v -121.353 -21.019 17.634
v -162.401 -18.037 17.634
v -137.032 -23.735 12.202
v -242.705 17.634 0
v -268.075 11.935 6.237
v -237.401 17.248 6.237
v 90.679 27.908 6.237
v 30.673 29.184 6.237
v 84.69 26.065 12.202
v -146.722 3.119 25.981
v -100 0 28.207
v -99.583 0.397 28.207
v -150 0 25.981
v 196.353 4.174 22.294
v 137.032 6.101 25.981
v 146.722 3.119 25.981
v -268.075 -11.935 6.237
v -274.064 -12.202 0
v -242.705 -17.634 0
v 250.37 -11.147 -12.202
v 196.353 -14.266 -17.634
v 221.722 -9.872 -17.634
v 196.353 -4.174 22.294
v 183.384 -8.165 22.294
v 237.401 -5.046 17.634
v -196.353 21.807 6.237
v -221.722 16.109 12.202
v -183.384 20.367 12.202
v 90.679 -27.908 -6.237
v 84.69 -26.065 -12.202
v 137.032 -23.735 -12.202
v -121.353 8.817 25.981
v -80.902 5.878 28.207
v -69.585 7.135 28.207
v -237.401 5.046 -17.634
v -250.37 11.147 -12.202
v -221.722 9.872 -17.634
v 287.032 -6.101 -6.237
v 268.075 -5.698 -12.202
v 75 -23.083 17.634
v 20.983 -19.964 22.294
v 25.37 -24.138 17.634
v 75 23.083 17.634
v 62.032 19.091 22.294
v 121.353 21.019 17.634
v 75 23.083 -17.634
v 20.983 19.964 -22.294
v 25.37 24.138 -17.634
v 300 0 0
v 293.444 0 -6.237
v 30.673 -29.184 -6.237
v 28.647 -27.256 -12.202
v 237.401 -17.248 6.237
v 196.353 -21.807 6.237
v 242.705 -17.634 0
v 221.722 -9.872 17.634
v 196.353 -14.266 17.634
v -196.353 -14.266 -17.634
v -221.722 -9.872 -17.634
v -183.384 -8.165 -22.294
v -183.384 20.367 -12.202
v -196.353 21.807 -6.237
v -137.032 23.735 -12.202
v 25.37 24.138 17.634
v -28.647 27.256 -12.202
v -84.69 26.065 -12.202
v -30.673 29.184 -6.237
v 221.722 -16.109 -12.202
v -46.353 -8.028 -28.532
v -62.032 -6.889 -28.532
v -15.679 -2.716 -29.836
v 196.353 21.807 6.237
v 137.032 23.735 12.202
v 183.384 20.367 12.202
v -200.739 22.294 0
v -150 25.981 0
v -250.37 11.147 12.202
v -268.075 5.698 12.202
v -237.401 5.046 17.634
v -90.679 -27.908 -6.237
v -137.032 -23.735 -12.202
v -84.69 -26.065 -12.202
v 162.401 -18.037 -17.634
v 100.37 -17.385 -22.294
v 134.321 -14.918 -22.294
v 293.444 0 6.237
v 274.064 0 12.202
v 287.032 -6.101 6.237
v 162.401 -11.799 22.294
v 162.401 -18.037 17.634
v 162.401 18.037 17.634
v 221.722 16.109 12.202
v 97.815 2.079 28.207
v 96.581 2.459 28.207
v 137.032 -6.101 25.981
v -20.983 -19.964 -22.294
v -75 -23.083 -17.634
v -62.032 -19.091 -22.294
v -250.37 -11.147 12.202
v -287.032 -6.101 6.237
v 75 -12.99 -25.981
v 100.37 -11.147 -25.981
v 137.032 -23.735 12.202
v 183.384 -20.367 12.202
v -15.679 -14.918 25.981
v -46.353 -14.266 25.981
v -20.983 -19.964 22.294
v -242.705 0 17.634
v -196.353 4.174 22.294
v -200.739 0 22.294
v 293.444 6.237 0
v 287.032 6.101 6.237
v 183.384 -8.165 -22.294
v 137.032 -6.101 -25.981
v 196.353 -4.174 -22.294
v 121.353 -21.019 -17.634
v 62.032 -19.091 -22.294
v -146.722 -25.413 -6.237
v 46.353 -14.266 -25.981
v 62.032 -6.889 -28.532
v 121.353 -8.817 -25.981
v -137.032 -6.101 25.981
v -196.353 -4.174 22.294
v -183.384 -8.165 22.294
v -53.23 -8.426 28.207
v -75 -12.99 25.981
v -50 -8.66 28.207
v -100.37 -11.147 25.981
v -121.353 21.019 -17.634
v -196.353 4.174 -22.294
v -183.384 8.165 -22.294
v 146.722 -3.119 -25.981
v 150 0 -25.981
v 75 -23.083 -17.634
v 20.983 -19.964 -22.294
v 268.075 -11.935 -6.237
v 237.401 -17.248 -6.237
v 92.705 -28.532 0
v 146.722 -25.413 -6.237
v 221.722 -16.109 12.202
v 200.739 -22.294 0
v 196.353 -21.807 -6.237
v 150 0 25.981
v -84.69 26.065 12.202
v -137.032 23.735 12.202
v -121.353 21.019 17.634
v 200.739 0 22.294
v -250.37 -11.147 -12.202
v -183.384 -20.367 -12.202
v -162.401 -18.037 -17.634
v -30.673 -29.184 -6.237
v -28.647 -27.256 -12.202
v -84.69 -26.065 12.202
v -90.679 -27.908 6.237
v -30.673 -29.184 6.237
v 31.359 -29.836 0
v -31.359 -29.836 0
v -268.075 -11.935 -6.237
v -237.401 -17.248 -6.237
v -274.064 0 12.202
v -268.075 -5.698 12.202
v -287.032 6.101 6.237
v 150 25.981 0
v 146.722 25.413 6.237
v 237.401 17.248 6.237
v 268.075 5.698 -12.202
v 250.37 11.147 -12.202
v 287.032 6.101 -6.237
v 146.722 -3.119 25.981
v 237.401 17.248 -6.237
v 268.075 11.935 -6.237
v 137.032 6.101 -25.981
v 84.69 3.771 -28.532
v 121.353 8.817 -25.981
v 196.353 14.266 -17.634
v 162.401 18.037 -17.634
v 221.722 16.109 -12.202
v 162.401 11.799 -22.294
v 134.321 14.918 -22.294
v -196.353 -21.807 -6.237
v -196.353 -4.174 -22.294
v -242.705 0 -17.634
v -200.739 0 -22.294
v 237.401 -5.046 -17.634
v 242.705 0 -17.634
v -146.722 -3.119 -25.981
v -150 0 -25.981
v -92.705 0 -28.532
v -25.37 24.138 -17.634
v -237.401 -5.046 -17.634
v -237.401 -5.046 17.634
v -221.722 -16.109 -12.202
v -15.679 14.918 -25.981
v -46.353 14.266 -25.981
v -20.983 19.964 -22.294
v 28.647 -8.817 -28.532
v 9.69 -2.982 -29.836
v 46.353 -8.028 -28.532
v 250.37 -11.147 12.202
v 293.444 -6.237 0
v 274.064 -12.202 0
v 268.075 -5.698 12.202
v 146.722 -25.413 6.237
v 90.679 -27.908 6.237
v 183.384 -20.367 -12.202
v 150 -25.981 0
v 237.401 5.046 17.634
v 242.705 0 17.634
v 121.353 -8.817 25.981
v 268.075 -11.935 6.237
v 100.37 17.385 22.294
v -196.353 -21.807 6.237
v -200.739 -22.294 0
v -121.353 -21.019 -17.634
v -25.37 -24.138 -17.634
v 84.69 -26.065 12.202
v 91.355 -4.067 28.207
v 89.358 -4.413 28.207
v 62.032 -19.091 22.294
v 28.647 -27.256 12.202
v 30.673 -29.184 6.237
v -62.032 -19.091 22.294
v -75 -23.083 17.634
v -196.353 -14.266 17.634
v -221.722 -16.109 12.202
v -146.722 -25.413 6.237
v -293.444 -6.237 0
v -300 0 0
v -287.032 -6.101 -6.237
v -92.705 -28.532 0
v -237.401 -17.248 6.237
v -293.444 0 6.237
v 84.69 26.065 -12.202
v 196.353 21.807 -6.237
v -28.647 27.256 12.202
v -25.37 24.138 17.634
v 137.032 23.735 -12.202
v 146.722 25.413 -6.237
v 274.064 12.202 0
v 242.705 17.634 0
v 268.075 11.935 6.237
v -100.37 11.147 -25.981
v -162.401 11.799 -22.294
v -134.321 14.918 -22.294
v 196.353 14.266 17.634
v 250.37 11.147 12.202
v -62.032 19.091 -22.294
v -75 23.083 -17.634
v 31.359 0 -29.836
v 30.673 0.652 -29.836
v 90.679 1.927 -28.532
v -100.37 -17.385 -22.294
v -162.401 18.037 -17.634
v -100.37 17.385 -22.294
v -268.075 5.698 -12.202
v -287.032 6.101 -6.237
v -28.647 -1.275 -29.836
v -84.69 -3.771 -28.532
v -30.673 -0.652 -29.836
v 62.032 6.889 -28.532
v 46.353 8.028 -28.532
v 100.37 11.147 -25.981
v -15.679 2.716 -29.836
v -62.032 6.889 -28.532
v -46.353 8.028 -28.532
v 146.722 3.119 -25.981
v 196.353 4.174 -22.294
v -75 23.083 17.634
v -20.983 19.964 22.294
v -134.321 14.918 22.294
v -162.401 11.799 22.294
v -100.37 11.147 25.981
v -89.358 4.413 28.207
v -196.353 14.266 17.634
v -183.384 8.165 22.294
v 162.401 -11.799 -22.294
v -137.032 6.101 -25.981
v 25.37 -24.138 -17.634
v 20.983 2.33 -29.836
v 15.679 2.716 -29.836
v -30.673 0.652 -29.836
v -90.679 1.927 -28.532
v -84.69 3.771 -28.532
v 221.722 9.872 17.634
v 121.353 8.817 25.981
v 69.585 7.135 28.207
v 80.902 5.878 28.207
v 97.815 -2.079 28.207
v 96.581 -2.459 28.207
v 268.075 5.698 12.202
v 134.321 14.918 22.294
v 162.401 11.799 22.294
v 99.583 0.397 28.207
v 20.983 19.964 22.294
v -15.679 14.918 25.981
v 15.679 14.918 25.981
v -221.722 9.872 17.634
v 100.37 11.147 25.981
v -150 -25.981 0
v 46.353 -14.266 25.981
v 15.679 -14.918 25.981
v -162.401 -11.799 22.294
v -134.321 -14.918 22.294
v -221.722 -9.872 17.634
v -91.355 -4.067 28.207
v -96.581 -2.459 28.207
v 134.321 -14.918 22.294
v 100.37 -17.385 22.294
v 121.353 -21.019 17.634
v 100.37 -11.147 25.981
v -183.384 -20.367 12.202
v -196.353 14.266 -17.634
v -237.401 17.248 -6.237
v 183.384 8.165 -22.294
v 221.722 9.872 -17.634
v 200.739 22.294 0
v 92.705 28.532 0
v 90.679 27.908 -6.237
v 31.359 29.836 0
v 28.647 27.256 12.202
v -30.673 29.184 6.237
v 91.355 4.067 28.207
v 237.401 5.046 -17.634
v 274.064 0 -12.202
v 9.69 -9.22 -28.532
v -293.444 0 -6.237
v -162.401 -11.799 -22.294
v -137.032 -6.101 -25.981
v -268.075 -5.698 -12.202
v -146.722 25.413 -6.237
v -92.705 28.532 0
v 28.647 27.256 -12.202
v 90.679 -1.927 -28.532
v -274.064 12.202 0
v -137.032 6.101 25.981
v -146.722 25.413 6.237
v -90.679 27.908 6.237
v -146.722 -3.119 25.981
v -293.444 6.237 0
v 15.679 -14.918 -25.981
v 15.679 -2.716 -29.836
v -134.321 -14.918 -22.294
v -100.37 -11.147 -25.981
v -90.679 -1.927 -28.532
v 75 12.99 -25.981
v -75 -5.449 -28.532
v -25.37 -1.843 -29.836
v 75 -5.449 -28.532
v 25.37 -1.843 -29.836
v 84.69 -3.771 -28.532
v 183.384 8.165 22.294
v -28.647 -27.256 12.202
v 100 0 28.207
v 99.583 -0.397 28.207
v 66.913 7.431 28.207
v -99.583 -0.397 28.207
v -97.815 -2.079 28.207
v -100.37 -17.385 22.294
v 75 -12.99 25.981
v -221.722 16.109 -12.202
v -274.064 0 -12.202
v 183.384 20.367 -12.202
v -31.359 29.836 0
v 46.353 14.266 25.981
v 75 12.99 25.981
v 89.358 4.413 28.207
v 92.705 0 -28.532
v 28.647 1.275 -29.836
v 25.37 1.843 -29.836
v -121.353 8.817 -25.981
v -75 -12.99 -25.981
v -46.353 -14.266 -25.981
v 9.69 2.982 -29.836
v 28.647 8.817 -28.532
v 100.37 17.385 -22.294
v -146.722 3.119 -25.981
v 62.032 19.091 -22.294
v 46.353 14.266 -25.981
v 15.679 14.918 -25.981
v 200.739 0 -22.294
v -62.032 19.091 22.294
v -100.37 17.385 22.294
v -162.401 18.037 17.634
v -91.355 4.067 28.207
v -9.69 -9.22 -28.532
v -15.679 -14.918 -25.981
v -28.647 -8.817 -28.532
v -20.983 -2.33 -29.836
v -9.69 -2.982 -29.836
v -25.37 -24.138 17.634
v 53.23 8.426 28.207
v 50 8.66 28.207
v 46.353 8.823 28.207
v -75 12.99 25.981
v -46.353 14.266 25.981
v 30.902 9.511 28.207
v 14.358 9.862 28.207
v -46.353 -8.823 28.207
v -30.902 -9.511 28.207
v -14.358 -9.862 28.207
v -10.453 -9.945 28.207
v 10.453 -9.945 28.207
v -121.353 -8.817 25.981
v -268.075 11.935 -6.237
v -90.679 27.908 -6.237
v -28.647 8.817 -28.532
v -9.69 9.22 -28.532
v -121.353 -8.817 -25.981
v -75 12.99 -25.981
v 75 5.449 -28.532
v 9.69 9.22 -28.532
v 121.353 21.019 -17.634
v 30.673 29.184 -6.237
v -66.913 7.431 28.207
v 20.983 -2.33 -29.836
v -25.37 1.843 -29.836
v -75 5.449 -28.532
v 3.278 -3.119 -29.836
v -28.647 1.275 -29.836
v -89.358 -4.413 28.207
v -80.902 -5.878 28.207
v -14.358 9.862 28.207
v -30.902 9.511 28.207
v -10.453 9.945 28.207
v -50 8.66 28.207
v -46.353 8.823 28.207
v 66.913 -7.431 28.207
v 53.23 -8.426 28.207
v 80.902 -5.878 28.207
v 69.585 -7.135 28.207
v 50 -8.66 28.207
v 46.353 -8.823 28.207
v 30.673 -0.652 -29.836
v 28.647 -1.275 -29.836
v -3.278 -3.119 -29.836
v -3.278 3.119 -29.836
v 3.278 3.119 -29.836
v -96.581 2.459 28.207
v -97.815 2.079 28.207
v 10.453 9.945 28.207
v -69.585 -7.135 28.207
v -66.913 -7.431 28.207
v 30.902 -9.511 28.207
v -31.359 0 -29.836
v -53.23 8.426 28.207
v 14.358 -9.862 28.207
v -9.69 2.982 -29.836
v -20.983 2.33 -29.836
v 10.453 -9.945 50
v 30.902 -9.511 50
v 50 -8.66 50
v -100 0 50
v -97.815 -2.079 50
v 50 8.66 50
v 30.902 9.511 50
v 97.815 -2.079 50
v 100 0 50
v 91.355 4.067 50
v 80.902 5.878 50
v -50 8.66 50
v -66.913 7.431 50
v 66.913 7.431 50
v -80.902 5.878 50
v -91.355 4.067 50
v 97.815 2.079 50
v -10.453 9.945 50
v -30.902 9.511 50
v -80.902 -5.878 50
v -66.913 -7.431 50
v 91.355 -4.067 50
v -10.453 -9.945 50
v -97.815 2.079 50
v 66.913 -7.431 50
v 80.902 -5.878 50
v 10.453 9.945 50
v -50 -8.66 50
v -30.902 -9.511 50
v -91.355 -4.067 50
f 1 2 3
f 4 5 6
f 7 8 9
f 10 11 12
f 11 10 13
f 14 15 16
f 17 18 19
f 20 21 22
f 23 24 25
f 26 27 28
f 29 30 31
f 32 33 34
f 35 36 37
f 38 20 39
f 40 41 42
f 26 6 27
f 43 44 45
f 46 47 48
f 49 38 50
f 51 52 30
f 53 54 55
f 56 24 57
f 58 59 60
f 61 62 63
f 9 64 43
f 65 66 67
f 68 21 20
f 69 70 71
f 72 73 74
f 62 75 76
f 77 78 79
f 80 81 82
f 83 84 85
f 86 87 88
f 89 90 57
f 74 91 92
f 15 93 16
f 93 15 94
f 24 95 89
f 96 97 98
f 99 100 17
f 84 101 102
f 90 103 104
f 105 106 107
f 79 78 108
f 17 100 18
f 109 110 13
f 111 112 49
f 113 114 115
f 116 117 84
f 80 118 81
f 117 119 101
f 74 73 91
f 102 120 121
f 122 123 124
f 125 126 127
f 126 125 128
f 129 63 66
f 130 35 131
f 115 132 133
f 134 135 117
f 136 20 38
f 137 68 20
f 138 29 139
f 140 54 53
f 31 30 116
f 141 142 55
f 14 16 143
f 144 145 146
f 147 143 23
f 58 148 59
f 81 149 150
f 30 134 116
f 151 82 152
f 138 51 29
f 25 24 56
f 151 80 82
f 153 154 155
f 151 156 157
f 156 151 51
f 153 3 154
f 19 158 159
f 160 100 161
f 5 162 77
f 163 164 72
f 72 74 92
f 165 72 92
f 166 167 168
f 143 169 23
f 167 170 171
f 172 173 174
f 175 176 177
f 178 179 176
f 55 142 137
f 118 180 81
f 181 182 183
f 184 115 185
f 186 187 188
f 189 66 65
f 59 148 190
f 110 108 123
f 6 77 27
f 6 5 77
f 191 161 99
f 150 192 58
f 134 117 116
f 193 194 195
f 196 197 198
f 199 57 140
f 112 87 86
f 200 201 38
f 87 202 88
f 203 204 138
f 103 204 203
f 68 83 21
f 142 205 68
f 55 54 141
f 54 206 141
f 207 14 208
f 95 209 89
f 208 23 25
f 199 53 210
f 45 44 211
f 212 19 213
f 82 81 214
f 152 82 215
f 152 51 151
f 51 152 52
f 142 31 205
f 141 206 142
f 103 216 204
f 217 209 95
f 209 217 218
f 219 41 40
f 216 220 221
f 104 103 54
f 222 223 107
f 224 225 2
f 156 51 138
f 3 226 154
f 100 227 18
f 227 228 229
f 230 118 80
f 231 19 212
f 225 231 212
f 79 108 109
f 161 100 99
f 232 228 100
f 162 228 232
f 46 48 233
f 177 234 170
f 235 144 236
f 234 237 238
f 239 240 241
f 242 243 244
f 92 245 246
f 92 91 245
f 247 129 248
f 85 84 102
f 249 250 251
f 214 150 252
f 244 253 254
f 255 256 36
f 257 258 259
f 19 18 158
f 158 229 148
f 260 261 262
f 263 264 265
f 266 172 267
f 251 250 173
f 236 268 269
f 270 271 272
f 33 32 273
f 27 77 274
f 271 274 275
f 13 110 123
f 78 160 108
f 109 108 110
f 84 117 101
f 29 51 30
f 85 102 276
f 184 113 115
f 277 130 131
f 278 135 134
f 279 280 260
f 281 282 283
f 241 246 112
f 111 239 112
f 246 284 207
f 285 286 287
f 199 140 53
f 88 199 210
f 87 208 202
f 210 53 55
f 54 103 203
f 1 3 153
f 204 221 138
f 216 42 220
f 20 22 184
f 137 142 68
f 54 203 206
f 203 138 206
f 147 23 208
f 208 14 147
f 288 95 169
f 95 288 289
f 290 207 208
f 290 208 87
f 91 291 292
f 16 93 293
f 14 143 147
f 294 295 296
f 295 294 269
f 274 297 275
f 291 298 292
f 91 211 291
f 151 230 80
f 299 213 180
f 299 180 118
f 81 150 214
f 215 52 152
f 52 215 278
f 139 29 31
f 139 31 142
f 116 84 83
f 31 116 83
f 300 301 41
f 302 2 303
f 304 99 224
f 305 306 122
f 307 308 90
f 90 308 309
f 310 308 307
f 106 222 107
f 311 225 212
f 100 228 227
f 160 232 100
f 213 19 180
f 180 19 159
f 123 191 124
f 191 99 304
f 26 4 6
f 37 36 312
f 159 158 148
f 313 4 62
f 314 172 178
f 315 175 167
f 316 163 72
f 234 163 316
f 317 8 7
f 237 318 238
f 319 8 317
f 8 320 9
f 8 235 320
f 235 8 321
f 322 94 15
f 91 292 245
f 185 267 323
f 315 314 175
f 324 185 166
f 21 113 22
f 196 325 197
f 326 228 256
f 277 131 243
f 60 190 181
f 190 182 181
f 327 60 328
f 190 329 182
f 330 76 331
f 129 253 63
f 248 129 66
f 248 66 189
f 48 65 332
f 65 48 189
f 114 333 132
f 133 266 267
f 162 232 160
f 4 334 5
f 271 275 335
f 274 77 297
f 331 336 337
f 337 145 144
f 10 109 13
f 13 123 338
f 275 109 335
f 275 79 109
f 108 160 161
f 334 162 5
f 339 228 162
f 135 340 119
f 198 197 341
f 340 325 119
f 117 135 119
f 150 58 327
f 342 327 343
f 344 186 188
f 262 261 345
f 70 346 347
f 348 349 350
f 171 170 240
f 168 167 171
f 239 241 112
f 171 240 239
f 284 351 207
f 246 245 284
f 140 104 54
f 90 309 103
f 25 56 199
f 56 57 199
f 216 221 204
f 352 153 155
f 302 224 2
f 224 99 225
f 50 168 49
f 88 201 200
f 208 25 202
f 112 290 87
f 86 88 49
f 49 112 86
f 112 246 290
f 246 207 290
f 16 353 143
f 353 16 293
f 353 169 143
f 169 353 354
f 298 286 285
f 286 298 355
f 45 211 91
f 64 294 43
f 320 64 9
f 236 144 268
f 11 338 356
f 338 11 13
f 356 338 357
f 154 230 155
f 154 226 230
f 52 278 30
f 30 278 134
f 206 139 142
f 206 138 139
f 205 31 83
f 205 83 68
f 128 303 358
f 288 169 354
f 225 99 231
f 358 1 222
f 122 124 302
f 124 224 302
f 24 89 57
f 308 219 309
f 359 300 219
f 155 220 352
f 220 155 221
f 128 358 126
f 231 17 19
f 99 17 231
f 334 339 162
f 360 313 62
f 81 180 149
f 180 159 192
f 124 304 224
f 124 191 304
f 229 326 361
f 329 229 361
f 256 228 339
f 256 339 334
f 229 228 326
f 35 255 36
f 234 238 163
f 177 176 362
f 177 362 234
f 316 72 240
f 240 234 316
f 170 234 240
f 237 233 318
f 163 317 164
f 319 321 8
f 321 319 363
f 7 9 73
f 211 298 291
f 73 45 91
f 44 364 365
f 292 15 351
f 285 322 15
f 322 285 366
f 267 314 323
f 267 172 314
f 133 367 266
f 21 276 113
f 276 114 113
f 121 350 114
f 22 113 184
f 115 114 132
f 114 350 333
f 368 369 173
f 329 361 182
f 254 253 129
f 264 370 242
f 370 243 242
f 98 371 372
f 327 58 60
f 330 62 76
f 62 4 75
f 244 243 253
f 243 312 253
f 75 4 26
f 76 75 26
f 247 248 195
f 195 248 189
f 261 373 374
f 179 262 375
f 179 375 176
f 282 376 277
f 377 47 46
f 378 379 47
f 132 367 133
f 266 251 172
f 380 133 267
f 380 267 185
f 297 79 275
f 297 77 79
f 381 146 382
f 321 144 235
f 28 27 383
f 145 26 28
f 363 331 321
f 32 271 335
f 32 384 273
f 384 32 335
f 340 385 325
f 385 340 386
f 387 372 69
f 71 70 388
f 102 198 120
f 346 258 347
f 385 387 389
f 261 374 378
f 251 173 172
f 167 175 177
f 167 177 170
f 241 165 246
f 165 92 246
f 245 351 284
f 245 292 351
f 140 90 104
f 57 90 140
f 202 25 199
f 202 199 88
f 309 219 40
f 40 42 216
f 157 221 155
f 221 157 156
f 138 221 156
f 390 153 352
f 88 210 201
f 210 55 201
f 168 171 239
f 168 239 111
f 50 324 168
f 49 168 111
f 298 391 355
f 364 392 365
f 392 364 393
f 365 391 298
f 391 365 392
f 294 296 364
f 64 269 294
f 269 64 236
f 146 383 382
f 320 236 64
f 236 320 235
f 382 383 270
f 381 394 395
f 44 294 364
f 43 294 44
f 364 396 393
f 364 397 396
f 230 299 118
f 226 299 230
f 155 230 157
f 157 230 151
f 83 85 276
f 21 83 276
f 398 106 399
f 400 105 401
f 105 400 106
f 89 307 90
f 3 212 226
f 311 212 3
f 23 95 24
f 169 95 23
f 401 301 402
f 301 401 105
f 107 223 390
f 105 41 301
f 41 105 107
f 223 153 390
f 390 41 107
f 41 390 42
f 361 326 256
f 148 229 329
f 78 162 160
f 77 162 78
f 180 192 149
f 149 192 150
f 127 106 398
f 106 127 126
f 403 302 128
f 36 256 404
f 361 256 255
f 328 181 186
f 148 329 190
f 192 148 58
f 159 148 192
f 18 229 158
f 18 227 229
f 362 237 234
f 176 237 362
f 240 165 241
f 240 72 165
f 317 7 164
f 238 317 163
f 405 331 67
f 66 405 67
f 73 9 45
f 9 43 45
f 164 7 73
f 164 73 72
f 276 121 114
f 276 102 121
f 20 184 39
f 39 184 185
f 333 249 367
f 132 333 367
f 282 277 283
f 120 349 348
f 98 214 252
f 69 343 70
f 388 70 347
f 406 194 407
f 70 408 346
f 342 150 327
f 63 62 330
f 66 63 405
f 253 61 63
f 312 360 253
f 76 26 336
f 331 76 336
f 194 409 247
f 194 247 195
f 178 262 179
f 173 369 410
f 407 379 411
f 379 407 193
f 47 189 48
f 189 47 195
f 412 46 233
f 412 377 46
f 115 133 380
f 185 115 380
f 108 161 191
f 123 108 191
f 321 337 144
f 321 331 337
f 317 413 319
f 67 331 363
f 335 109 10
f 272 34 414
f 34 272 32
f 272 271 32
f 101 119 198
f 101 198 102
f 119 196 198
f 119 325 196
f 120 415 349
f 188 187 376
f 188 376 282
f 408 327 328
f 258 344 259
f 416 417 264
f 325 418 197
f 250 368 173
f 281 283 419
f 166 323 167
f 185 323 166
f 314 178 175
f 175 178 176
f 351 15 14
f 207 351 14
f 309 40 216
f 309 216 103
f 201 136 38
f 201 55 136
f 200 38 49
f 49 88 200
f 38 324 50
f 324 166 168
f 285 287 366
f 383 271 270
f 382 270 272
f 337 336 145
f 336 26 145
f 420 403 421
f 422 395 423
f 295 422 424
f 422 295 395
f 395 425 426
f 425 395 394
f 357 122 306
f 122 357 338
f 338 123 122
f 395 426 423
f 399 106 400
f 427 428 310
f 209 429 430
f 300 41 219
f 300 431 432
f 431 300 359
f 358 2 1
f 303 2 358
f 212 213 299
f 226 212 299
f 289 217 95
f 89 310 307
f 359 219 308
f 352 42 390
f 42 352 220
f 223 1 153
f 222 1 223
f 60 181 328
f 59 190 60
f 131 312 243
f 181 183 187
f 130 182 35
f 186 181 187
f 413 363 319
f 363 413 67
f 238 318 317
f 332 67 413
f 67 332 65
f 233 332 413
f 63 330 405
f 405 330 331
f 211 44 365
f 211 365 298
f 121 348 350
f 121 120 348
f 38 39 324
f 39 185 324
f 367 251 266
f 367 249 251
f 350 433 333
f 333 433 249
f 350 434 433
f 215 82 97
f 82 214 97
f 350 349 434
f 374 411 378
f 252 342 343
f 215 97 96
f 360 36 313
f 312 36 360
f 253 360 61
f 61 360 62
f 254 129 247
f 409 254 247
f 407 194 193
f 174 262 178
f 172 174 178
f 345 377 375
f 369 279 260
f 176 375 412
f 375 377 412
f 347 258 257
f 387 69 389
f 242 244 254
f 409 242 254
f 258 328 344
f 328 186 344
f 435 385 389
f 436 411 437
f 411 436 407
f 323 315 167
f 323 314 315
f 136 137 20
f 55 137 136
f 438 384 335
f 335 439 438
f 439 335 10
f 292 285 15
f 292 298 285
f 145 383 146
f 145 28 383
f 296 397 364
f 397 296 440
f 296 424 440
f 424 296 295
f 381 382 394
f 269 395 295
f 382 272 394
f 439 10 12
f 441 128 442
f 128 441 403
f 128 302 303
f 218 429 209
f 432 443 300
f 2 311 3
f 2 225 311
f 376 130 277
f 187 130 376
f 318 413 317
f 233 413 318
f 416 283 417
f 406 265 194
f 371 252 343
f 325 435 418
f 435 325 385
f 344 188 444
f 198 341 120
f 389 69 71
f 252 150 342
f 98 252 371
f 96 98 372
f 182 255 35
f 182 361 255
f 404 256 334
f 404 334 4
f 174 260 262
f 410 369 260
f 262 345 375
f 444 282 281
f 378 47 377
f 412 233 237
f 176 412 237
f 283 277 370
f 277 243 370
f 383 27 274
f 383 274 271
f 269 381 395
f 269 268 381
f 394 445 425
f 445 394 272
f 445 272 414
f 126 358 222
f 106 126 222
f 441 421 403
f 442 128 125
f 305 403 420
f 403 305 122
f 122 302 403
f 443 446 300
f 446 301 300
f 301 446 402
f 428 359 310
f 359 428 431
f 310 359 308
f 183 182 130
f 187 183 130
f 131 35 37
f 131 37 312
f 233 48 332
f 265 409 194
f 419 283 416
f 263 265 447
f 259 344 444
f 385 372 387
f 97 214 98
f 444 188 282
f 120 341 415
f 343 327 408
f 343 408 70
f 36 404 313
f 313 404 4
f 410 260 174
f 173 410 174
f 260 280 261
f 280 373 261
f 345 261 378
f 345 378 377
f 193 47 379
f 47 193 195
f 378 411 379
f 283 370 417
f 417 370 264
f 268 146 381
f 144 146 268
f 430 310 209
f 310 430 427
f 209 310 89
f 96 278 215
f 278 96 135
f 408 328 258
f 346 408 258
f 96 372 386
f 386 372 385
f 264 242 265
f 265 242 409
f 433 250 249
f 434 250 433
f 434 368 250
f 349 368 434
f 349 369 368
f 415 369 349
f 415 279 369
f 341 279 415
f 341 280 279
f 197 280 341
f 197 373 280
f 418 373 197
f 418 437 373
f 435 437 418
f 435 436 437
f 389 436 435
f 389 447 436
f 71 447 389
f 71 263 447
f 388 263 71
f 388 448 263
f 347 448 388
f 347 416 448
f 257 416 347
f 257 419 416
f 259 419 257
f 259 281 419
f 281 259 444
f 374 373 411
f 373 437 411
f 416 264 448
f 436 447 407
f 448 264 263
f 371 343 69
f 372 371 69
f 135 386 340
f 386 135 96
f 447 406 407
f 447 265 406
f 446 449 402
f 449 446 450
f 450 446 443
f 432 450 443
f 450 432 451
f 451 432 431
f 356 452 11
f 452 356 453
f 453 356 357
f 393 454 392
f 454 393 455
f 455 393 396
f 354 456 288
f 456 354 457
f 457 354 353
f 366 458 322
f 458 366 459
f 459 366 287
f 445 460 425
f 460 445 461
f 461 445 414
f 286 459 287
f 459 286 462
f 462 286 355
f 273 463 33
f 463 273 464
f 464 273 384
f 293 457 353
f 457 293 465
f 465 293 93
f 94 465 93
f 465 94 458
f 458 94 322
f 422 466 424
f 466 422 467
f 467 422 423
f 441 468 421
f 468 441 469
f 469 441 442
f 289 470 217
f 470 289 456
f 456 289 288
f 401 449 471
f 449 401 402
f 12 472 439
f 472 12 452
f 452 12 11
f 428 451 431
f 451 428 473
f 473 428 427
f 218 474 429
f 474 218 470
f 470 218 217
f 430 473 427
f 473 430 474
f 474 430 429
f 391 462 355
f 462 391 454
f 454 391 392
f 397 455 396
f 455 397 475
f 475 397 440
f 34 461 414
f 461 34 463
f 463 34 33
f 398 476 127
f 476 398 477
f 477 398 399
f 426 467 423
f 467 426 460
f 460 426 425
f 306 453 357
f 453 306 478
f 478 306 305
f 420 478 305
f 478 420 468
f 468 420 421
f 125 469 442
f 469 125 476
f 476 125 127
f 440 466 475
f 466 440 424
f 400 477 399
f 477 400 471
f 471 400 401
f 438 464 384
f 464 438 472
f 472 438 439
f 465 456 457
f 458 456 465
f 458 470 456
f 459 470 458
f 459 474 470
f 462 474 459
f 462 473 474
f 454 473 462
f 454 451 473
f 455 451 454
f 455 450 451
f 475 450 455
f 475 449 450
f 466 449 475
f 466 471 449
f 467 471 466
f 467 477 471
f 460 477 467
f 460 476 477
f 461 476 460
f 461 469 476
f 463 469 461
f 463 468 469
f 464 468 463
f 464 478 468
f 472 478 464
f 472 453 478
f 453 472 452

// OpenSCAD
module elongate() {
  for (i = [0 : $children-1])
    scale([10 , 1, 1 ]) child(i);
}

elongate() { sphere(30); cube([10,10,10]); cylinder(r=10,h=50); }
